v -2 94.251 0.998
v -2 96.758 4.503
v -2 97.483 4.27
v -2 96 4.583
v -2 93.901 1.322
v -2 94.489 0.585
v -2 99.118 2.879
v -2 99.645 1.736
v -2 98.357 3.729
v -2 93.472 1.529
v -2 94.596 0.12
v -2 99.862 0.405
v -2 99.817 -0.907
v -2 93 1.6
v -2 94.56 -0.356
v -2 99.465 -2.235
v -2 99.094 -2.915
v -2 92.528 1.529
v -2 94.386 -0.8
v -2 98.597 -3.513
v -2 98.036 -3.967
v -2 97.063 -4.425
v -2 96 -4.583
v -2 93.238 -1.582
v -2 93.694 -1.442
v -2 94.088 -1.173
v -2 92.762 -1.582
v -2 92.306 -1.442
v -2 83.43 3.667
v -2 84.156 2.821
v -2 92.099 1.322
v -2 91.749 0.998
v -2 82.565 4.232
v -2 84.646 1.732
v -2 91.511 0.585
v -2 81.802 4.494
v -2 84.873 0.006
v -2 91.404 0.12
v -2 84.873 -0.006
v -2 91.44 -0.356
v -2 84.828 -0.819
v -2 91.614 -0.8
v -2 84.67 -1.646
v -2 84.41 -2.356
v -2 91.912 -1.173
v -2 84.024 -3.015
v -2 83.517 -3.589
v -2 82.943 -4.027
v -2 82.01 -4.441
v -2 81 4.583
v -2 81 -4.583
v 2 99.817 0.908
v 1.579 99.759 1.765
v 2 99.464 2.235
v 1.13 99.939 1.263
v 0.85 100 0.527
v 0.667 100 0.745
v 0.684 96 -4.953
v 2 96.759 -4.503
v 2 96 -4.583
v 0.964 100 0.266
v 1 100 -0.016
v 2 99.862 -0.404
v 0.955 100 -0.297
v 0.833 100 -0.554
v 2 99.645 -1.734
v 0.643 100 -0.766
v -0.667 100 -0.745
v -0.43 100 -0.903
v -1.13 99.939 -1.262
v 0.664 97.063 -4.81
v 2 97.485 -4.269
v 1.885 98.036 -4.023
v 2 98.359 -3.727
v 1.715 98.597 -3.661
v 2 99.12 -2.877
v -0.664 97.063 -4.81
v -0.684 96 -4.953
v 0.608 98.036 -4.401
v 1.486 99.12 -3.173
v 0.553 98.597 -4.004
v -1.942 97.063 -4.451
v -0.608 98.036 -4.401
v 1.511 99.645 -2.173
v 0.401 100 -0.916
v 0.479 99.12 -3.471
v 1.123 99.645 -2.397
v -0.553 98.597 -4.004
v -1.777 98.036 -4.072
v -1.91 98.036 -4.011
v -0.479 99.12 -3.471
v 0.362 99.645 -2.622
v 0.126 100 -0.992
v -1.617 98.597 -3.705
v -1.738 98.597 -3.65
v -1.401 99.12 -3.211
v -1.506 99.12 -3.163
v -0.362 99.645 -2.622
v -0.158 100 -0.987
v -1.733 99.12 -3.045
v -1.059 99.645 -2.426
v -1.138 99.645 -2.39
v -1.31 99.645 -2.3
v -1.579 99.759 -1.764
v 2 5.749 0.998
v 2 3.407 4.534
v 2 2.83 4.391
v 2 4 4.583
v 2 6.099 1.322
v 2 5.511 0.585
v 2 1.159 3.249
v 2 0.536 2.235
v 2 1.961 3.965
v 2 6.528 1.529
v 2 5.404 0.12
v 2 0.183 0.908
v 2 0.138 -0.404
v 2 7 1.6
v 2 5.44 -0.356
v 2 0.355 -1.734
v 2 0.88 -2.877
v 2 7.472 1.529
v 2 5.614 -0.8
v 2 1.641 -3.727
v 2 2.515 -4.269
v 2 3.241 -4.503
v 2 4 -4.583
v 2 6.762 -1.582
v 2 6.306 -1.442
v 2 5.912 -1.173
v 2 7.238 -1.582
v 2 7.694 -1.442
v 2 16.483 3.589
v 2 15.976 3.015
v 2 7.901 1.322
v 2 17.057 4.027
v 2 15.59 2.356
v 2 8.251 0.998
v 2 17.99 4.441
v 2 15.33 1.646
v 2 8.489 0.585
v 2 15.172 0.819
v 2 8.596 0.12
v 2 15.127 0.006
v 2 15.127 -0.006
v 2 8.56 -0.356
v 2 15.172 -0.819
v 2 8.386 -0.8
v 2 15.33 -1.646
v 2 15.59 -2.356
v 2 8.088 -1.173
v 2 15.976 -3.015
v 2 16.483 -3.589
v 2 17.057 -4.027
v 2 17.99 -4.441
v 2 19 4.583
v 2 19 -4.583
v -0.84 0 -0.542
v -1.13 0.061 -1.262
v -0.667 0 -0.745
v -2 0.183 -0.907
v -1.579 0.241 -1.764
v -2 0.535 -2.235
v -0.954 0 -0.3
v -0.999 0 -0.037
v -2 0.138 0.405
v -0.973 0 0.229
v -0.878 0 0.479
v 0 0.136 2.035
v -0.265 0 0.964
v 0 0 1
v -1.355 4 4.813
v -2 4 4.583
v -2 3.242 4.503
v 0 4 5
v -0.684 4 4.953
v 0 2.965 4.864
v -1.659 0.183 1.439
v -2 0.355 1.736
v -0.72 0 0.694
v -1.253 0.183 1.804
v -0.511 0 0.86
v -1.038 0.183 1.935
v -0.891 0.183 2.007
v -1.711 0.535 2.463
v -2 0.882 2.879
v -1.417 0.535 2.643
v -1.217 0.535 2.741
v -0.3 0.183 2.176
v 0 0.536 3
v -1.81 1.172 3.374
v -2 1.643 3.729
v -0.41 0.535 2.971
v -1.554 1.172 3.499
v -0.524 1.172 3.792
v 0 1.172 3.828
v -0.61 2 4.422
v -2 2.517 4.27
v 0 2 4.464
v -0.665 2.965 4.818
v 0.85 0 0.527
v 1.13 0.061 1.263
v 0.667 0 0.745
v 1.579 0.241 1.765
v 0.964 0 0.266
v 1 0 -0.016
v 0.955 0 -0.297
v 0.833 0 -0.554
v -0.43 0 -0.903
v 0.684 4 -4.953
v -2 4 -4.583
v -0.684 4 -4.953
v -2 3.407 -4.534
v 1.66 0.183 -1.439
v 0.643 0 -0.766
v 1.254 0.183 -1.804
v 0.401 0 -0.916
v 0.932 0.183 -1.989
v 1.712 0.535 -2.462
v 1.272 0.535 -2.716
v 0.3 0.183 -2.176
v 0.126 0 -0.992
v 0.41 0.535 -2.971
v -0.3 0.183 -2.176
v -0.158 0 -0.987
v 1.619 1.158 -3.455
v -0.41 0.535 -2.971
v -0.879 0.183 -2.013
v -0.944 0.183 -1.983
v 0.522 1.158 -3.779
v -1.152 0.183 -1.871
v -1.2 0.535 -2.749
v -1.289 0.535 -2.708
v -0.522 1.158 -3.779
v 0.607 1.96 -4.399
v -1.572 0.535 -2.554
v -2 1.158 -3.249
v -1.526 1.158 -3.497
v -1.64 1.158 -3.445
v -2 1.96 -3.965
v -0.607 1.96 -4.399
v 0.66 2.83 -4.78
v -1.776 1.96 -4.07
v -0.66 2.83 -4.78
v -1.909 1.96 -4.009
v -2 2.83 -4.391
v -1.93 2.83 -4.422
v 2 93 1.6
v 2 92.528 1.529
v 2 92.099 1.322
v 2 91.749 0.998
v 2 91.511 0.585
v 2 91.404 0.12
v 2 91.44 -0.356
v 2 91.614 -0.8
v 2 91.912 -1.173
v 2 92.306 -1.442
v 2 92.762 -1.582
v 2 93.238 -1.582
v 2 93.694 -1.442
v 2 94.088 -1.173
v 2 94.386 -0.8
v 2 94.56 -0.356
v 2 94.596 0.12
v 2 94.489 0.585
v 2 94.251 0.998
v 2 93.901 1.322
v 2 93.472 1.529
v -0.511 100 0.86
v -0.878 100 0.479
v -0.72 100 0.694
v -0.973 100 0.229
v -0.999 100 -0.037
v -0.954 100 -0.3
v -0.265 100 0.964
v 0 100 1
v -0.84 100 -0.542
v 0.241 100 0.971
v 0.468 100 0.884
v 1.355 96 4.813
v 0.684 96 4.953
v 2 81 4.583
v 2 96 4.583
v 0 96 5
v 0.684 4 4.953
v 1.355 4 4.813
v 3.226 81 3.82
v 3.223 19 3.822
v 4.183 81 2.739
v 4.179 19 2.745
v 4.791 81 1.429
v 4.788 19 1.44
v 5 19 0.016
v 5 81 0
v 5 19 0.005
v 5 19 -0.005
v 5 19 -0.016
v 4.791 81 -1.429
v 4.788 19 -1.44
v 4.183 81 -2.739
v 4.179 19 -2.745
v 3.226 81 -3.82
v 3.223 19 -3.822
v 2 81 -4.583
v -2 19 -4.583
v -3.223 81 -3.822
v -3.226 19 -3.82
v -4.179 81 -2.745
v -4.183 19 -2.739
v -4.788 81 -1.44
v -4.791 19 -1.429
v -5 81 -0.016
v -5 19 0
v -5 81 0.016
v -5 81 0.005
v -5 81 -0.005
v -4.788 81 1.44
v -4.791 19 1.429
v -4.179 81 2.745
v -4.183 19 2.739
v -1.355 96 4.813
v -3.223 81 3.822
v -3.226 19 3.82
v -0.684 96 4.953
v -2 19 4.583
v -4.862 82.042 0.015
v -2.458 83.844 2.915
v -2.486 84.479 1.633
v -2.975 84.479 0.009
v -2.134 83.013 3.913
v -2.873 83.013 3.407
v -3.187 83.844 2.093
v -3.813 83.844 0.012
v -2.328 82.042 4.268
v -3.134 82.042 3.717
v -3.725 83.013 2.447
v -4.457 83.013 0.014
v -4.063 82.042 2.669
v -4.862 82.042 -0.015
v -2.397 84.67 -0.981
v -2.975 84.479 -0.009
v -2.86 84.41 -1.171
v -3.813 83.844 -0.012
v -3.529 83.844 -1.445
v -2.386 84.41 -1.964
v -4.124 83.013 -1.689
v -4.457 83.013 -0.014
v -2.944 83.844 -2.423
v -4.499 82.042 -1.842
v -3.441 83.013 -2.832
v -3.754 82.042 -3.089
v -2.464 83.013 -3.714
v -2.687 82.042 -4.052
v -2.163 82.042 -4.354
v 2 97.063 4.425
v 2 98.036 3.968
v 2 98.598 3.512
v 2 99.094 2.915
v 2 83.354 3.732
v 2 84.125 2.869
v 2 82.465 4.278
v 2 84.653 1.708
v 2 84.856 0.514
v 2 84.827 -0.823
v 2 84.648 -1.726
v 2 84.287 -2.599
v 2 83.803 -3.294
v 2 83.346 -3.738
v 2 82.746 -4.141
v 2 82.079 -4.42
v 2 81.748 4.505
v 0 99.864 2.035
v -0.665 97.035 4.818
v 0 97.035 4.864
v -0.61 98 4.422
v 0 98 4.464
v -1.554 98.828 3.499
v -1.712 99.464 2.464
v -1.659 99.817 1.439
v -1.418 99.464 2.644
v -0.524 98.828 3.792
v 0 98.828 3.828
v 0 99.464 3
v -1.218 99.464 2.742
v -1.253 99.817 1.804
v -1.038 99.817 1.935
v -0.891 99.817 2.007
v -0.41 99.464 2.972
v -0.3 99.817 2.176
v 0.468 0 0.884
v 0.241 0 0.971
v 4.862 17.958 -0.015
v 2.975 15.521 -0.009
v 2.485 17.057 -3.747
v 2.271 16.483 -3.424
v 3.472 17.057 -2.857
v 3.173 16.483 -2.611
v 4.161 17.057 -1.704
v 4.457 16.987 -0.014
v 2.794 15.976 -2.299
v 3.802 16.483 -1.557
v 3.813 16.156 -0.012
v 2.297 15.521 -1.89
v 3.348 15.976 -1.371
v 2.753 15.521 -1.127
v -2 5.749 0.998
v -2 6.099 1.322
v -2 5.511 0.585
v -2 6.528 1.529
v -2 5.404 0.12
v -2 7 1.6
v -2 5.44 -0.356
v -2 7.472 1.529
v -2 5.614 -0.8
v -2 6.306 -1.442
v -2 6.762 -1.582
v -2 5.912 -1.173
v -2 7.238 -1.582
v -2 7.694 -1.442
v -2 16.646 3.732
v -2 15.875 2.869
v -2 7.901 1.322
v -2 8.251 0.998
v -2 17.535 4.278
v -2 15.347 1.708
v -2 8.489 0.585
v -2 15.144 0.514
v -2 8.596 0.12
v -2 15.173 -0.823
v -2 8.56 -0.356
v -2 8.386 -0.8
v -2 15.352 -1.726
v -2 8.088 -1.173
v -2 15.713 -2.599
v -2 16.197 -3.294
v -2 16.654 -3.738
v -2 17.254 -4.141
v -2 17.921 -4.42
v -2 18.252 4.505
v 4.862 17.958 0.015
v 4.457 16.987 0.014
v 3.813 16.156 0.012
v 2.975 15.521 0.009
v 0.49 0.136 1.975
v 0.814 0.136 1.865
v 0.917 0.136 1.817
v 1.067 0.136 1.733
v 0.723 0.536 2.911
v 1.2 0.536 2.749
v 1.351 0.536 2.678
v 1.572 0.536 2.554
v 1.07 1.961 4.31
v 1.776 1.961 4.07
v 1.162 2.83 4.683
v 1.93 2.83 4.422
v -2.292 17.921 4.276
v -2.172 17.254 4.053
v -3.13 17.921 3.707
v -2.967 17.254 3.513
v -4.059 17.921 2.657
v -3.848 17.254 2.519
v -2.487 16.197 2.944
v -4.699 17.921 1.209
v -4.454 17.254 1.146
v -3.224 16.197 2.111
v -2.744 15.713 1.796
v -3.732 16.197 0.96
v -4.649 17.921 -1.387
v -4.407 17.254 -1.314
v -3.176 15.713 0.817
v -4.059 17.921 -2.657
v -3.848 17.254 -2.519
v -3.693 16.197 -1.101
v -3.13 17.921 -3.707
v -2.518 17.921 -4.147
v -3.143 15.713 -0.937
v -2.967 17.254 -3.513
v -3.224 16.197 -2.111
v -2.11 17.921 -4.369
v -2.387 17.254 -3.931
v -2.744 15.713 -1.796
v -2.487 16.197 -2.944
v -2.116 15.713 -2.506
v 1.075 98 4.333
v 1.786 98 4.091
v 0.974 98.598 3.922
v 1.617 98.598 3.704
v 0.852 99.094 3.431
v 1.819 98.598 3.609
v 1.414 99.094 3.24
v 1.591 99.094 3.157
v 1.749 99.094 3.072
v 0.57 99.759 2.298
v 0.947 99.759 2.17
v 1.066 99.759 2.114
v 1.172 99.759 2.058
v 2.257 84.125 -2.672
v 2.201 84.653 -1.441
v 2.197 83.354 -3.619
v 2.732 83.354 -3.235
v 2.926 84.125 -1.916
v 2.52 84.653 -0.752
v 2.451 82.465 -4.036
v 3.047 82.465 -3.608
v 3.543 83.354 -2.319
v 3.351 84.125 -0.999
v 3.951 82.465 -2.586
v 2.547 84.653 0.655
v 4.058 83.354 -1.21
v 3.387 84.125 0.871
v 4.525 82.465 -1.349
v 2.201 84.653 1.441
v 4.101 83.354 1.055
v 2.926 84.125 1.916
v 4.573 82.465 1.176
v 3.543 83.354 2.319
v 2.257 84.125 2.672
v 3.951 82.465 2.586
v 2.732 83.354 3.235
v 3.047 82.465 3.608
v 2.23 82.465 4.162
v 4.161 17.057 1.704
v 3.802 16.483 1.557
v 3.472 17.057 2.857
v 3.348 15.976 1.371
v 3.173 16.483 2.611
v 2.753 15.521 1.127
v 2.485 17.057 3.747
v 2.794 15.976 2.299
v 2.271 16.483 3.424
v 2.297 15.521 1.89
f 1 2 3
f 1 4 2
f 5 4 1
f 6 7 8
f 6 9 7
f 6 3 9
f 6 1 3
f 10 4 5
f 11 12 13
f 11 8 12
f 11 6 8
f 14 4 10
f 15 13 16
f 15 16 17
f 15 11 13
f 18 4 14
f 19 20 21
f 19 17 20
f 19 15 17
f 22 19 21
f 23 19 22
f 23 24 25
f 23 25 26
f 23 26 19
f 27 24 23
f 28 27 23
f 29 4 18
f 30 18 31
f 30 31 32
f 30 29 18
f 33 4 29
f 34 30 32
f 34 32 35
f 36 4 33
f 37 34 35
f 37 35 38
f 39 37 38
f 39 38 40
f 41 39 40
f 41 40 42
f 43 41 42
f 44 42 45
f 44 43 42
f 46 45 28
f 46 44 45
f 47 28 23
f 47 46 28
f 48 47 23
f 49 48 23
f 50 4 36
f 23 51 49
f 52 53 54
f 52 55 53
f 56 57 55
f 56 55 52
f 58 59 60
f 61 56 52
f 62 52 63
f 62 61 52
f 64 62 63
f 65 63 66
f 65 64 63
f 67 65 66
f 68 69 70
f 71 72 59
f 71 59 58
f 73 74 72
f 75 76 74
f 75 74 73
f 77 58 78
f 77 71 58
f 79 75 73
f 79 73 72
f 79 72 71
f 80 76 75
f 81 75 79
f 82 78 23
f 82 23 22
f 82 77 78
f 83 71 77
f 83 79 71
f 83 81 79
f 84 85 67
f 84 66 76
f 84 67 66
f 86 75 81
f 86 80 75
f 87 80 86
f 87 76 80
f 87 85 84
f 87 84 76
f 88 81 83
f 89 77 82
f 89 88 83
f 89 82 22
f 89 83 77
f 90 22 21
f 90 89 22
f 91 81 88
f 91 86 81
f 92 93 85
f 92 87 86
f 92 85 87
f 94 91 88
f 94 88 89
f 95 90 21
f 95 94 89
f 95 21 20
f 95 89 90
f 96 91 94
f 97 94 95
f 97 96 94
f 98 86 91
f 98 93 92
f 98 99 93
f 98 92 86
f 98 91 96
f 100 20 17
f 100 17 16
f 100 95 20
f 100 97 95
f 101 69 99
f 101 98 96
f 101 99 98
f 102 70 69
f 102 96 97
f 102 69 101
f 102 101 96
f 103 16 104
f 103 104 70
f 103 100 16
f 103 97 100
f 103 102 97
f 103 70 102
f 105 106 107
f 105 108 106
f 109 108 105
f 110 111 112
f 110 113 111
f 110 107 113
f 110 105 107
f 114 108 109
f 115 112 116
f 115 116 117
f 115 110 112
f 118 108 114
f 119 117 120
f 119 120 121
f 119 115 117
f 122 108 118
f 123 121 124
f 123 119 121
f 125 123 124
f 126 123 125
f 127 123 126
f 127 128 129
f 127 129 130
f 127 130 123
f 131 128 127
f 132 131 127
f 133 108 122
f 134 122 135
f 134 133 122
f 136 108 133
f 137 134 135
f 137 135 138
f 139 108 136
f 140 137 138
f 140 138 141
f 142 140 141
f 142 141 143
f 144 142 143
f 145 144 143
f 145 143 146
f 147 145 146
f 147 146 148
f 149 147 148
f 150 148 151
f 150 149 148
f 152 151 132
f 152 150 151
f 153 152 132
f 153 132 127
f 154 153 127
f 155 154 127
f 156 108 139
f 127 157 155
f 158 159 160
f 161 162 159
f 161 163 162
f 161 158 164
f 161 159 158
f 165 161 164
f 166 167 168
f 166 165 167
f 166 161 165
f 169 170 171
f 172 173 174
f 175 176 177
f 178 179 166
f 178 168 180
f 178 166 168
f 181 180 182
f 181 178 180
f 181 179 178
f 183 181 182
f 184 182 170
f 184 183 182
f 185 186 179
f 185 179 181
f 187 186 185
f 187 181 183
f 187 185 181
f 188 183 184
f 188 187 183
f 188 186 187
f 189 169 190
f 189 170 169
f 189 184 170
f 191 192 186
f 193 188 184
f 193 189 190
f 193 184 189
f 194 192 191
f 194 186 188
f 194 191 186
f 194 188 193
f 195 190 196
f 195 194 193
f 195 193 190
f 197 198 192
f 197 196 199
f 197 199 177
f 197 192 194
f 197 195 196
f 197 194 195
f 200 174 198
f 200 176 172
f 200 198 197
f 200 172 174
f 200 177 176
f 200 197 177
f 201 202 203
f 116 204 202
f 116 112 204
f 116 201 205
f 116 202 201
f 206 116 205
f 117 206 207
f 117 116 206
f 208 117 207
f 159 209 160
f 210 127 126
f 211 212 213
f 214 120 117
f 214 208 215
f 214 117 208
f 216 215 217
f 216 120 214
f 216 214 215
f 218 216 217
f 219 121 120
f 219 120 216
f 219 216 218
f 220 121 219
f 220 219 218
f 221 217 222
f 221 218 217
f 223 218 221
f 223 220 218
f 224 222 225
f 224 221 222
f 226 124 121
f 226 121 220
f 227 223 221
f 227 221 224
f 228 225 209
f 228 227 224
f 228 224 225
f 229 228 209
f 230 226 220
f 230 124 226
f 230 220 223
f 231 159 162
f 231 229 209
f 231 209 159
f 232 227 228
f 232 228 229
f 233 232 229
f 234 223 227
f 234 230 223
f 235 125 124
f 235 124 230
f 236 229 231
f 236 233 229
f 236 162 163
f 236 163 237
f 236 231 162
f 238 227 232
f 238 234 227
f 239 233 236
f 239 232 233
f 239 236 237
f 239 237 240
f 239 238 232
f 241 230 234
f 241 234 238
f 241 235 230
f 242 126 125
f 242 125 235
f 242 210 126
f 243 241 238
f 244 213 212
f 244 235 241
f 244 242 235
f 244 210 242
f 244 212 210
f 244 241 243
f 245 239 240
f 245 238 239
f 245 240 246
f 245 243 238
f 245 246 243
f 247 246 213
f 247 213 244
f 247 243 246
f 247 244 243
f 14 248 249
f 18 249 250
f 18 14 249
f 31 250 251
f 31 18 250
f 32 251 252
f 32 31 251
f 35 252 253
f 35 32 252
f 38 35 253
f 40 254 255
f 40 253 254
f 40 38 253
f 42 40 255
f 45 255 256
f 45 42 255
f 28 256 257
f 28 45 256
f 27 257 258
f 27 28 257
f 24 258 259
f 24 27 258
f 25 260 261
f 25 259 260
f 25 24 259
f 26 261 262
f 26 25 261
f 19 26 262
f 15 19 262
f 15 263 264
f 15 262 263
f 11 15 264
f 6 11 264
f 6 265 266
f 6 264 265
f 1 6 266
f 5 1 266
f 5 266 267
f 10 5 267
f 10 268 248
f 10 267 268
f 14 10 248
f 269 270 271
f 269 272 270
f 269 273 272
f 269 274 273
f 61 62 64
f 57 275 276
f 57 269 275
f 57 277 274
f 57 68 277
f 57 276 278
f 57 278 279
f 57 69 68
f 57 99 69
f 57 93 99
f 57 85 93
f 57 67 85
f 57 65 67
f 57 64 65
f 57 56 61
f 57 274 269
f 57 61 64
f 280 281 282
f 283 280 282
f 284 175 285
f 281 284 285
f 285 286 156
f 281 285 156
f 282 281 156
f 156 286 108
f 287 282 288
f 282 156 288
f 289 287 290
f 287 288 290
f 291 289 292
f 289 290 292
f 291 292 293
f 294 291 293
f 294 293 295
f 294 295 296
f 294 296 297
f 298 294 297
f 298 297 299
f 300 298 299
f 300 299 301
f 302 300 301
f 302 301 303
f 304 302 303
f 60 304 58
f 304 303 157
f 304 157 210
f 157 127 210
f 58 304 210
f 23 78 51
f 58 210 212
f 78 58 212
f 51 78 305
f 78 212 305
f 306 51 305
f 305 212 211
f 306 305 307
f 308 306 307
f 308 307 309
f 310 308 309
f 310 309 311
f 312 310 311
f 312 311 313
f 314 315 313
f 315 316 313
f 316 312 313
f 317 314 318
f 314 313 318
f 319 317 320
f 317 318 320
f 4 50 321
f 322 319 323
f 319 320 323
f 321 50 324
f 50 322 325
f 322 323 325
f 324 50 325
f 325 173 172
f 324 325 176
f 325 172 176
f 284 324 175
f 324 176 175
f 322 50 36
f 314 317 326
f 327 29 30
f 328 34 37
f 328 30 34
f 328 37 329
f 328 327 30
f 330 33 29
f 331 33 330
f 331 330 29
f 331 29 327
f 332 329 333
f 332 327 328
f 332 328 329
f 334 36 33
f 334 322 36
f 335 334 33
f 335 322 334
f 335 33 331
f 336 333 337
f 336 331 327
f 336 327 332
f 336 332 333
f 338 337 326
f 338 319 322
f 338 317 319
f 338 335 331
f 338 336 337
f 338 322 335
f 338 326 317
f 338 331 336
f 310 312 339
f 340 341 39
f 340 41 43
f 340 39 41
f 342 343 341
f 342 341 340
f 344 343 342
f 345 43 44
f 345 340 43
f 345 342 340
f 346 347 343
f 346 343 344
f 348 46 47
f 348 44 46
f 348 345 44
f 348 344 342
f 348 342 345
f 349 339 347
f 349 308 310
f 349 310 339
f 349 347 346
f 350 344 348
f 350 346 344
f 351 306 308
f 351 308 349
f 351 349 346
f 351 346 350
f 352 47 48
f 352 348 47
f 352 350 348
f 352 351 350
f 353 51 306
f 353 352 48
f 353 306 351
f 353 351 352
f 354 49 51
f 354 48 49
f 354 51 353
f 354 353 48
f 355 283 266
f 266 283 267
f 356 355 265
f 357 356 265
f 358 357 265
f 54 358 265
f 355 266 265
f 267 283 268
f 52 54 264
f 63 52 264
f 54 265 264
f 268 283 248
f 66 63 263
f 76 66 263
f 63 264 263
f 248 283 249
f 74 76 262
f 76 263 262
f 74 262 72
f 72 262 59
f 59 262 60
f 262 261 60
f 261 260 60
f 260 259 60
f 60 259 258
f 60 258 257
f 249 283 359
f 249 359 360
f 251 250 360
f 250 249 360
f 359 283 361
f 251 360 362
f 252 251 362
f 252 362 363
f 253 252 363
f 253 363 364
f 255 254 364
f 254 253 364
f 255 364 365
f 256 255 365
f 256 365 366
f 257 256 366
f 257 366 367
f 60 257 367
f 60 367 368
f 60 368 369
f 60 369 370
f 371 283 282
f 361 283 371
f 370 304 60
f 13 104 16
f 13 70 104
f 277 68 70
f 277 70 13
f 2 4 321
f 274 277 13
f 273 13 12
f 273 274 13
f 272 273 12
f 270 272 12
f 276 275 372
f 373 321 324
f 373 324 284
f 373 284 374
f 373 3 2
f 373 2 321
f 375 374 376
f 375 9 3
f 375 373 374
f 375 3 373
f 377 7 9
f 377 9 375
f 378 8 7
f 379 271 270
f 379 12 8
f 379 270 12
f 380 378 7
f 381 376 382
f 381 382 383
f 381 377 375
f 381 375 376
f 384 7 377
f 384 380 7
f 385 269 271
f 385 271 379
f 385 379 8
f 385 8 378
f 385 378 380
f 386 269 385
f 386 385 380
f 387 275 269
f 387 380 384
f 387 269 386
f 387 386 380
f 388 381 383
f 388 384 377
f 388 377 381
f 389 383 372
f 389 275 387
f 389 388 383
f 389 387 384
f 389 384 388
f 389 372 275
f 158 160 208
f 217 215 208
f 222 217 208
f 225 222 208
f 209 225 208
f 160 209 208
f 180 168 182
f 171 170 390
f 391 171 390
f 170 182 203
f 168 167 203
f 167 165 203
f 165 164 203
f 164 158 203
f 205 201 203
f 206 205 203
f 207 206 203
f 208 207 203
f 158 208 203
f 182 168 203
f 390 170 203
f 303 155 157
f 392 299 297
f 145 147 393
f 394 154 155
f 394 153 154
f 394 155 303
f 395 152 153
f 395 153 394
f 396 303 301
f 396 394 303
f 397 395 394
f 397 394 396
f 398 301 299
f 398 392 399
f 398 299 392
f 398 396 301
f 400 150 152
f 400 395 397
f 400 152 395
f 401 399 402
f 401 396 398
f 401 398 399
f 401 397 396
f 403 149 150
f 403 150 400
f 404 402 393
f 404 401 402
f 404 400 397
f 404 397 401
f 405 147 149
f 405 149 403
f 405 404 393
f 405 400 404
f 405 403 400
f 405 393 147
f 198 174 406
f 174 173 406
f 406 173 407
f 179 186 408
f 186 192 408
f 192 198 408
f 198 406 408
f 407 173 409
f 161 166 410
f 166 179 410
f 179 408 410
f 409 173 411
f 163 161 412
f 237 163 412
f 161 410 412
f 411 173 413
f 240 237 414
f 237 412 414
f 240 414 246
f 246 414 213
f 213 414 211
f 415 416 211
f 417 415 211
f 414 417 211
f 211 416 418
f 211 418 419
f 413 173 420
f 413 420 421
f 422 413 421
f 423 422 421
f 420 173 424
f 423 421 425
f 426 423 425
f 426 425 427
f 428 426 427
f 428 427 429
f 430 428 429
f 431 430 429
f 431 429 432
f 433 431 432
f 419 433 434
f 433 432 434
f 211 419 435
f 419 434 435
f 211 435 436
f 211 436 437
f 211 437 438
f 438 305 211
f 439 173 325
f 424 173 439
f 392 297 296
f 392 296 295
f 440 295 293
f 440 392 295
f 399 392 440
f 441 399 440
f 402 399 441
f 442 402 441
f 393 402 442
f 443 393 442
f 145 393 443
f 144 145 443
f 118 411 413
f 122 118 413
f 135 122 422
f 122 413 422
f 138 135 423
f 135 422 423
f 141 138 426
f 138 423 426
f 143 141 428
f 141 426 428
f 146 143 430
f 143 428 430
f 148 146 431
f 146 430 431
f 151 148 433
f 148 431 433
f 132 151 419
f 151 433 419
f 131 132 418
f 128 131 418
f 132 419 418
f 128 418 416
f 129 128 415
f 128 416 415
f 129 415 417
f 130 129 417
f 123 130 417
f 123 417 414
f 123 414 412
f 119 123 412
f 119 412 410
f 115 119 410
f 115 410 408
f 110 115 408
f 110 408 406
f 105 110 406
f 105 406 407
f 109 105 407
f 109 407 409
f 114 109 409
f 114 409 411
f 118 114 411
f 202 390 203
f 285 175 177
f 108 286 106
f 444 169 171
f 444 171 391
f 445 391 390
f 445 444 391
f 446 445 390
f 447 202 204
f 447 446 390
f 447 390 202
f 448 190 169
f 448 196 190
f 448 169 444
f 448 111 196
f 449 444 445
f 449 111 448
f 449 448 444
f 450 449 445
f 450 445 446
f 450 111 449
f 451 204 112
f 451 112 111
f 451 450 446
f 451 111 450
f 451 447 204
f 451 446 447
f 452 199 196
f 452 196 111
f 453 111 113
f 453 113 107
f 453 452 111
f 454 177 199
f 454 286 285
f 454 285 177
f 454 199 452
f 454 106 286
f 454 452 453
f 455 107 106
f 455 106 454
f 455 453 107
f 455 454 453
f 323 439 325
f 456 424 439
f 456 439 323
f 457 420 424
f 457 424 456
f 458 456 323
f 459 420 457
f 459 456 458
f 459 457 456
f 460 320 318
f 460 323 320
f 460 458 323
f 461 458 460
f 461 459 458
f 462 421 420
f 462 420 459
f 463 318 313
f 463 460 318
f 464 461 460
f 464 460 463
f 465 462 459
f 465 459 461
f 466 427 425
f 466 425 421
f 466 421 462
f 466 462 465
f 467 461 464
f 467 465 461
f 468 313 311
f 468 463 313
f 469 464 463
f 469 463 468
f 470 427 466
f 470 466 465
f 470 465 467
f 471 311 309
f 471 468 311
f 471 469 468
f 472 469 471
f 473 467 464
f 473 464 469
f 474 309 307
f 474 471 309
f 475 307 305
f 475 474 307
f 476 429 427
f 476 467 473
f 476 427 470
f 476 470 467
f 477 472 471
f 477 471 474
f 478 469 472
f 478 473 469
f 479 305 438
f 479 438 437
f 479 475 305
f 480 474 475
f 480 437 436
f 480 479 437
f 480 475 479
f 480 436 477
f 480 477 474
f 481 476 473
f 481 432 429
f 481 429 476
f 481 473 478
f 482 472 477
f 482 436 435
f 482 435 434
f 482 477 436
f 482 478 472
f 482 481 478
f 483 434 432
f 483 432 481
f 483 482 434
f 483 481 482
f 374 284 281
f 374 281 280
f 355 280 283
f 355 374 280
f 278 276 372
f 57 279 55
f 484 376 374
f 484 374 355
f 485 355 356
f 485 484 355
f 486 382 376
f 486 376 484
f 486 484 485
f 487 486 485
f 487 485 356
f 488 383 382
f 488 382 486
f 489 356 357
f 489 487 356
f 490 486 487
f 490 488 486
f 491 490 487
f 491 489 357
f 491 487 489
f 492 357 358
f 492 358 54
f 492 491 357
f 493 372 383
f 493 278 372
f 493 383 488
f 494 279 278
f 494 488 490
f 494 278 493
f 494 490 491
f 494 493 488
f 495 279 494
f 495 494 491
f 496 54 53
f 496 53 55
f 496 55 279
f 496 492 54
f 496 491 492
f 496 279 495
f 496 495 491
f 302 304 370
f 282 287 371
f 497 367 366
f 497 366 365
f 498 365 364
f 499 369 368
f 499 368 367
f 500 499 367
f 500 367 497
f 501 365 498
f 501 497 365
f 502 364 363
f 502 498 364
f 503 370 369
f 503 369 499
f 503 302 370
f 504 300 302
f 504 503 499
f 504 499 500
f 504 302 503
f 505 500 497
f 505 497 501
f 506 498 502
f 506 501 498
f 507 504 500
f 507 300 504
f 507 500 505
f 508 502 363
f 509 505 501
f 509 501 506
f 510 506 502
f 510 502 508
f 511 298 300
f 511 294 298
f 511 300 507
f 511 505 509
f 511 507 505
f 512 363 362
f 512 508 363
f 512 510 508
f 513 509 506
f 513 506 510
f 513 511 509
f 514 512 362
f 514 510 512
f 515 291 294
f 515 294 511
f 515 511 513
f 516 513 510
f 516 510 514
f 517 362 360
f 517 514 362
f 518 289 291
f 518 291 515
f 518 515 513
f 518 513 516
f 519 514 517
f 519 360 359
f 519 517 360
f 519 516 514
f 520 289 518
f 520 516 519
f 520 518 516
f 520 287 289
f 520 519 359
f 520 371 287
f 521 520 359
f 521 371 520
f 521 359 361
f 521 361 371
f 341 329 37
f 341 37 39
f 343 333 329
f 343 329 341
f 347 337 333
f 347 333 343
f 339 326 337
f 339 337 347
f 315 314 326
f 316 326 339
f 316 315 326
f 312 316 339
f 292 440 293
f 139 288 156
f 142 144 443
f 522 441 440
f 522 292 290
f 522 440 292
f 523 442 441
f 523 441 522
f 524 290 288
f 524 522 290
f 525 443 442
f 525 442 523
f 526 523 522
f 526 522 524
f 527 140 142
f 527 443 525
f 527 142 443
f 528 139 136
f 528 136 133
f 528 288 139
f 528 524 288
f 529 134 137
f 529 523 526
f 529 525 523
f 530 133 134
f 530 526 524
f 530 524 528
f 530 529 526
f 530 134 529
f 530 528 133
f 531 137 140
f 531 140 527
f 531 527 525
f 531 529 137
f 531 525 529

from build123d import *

# Parameters (mm, degrees)
SKETCH10_R              = 5
BOSS_EXTRUDE1_DEPTH     = 100
SKETCH11_W              = 10
SKETCH11_H              = 15
CUT_EXTRUDE1_DEPTH      = 100
SKETCH12_R              = 1.6
CUT_EXTRUDE2_DEPTH      = 101.369318021
MIRROR8_COPY_1_SKETCH_W = 10
MIRROR8_COPY_1_SKETCH_H = 15
MIRROR8_COPY_1_DEPTH    = 100
MIRROR8_COPY_2_SKETCH_W = 10
MIRROR8_COPY_2_SKETCH_H = 15
MIRROR8_COPY_2_DEPTH    = 100
FILLET1_R               = 4
FILLET2_R               = 4


with BuildPart() as part:
    # Sketch10 → Boss-Extrude1 (new body)
    with BuildSketch(Plane(origin=(0, 0, 0), x_dir=(1, 0, 0), z_dir=(0, 1, 0))):
        with Locations(Location((0, 0, 0), (0, 0, 270))):
            Circle(SKETCH10_R)
    extrude(amount=BOSS_EXTRUDE1_DEPTH)

    # Sketch11 → Cut-Extrude1 (cut)
    with BuildSketch(Plane(origin=(2, 0, 0), x_dir=(0, 0, -1), z_dir=(1, 0, 0))):
        with Locations((0, 7.5)):
            Rectangle(SKETCH11_W, SKETCH11_H)
    cut_extrude1 = extrude(amount=CUT_EXTRUDE1_DEPTH, mode=Mode.SUBTRACT)

    # Mirror1: Cut-Extrude1 across plane
    add(cut_extrude1.mirror(Plane(origin=(0, 0, 0), x_dir=(0, 0, 1), z_dir=(1, 0, 0))), mode=Mode.SUBTRACT)

    # Sketch12 → Cut-Extrude2 (cut, through all)
    with BuildSketch(Plane.ZY.offset(2)):
        with Locations((0, 7)):
            Circle(SKETCH12_R)
    cut_extrude2 = extrude(amount=-CUT_EXTRUDE2_DEPTH, mode=Mode.SUBTRACT)

    # Mirror7: Cut-Extrude1 across plane
    add(cut_extrude1.mirror(Plane(origin=(0, 50, 0), x_dir=(0, 0, 1), z_dir=(0, -1, 0))), mode=Mode.SUBTRACT)

    # Mirror8 copy 1 sketch → Mirror8 copy 1 (cut)
    with BuildSketch(Plane(origin=(-2, 100, 0), x_dir=(0, 0, -1), z_dir=(-1, 0, 0))):
        with Locations((0, 7.5)):
            Rectangle(MIRROR8_COPY_1_SKETCH_W, MIRROR8_COPY_1_SKETCH_H)
    extrude(amount=MIRROR8_COPY_1_DEPTH, mode=Mode.SUBTRACT)

    # Mirror8 copy 2 sketch → Mirror8 copy 2 (cut)
    with BuildSketch(Plane(origin=(2, 100, 0), x_dir=(0, 0, -1), z_dir=(1, 0, 0))):
        with Locations((0, -7.5)):
            Rectangle(MIRROR8_COPY_2_SKETCH_W, MIRROR8_COPY_2_SKETCH_H)
    extrude(amount=MIRROR8_COPY_2_DEPTH, mode=Mode.SUBTRACT)

    # Mirror9: Cut-Extrude2 across plane
    add(cut_extrude2.mirror(Plane(origin=(0, 50, 0), x_dir=(0, 0, 1), z_dir=(0, -1, 0))), mode=Mode.SUBTRACT)

    # Fillet1
    # the kernel refuses this fillet: 4 mm, written as the material it takes off along each edge
    with BuildSketch(Plane(origin=(0, 15, 0), x_dir=(0.9999950652018581, 0, 0.003141587485879613), z_dir=(0.003141587485879613, 0, -0.9999950652018581))) as fillet1_piece_1_section:
        with BuildLine():
            CenterArc((5 - FILLET1_R, -FILLET1_R), FILLET1_R, 0, 90)
            Line((5 - FILLET1_R, 0), (5, 0))
            Line((5, 0), (5, -FILLET1_R))
        make_face()
    fillet1_piece_1 = revolve(axis=Axis((0, 15, 0), (0, -1, 0)), revolution_arc=359.64, mode=Mode.PRIVATE)
    fillet1_piece_1 = split(fillet1_piece_1, bisect_by=Plane(origin=(2, 16.020930517, 2.132715254), z_dir=(1, 0, 0)), keep=Keep.TOP, mode=Mode.PRIVATE)
    add(fillet1_piece_1, mode=Mode.SUBTRACT)
    with BuildSketch(Plane(origin=(0, 15, 0), x_dir=(0.9999950652018581, 0, 0.003141587485879613), z_dir=(0.003141587485879613, 0, -0.9999950652018581))) as fillet1_piece_2_section:
        with BuildLine():
            CenterArc((5 - FILLET1_R, -FILLET1_R), FILLET1_R, 0, 90)
            Line((5 - FILLET1_R, 0), (5, 0))
            Line((5, 0), (5, -FILLET1_R))
        make_face()
    fillet1_piece_2 = revolve(axis=Axis((0, 15, 0), (0, -1, 0)), revolution_arc=359.64, mode=Mode.PRIVATE)
    fillet1_piece_2 = split(fillet1_piece_2, bisect_by=Plane(origin=(-2, 16.531416738, 0), z_dir=(-1, 0, 0)), keep=Keep.TOP, mode=Mode.PRIVATE)
    add(fillet1_piece_2, mode=Mode.SUBTRACT)
    with BuildSketch(Plane(origin=(0, 15, 0), x_dir=(-0.9999950652018581, 0, -0.0031415874858794907), z_dir=(-0.0031415874858794907, 0, 0.9999950652018581))) as fillet1_piece_3_section:
        with BuildLine():
            CenterArc((5 - FILLET1_R, -FILLET1_R), FILLET1_R, 0, 90)
            Line((5 - FILLET1_R, 0), (5, 0))
            Line((5, 0), (5, -FILLET1_R))
        make_face()
    fillet1_piece_3 = revolve(axis=Axis((0, 15, 0), (0, -1, 0)), revolution_arc=359.64, mode=Mode.PRIVATE)
    fillet1_piece_3 = split(fillet1_piece_3, bisect_by=Plane(origin=(-2, 16.020930615, -2.132715254), z_dir=(-1, 0, 0)), keep=Keep.TOP, mode=Mode.PRIVATE)
    add(fillet1_piece_3, mode=Mode.SUBTRACT)
    with BuildSketch(Plane(origin=(0, 15, 0), x_dir=(-0.9999950652018581, 0, -0.0031415874858794907), z_dir=(-0.0031415874858794907, 0, 0.9999950652018581))) as fillet1_piece_4_section:
        with BuildLine():
            CenterArc((5 - FILLET1_R, -FILLET1_R), FILLET1_R, 0, 90)
            Line((5 - FILLET1_R, 0), (5, 0))
            Line((5, 0), (5, -FILLET1_R))
        make_face()
    fillet1_piece_4 = revolve(axis=Axis((0, 15, 0), (0, -1, 0)), revolution_arc=359.64, mode=Mode.PRIVATE)
    fillet1_piece_4 = split(fillet1_piece_4, bisect_by=Plane(origin=(2, 16.531416738, 0), z_dir=(1, 0, 0)), keep=Keep.TOP, mode=Mode.PRIVATE)
    add(fillet1_piece_4, mode=Mode.SUBTRACT)
    with BuildSketch(Plane(origin=(0, 85, 0), x_dir=(-0.9999950652018581, 0, -0.0031415874858794907), z_dir=(-0.0031415874858794907, 0, 0.9999950652018581))) as fillet1_piece_5_section:
        with BuildLine():
            CenterArc((5 - FILLET1_R, FILLET1_R), FILLET1_R, 270, 90)
            Line((5 - FILLET1_R, 0), (5, 0))
            Line((5, 0), (5, FILLET1_R))
        make_face()
    fillet1_piece_5 = revolve(axis=Axis((0, 85, 0), (0, -1, 0)), revolution_arc=359.64, mode=Mode.PRIVATE)
    fillet1_piece_5 = split(fillet1_piece_5, bisect_by=Plane(origin=(-2, 83.979069385, -2.132715254), z_dir=(-1, 0, 0)), keep=Keep.TOP, mode=Mode.PRIVATE)
    add(fillet1_piece_5, mode=Mode.SUBTRACT)
    with BuildSketch(Plane(origin=(0, 85, 0), x_dir=(-0.9999950652018581, 0, -0.0031415874858794907), z_dir=(-0.0031415874858794907, 0, 0.9999950652018581))) as fillet1_piece_6_section:
        with BuildLine():
            CenterArc((5 - FILLET1_R, FILLET1_R), FILLET1_R, 270, 90)
            Line((5 - FILLET1_R, 0), (5, 0))
            Line((5, 0), (5, FILLET1_R))
        make_face()
    fillet1_piece_6 = revolve(axis=Axis((0, 85, 0), (0, -1, 0)), revolution_arc=359.64, mode=Mode.PRIVATE)
    fillet1_piece_6 = split(fillet1_piece_6, bisect_by=Plane(origin=(2, 83.468583262, 0), z_dir=(1, 0, 0)), keep=Keep.TOP, mode=Mode.PRIVATE)
    add(fillet1_piece_6, mode=Mode.SUBTRACT)
    with BuildSketch(Plane(origin=(0, 85, 0), x_dir=(0.9999950652018581, 0, 0.003141587485879613), z_dir=(0.003141587485879613, 0, -0.9999950652018581))) as fillet1_piece_7_section:
        with BuildLine():
            CenterArc((5 - FILLET1_R, FILLET1_R), FILLET1_R, 270, 90)
            Line((5 - FILLET1_R, 0), (5, 0))
            Line((5, 0), (5, FILLET1_R))
        make_face()
    fillet1_piece_7 = revolve(axis=Axis((0, 85, 0), (0, -1, 0)), revolution_arc=359.64, mode=Mode.PRIVATE)
    fillet1_piece_7 = split(fillet1_piece_7, bisect_by=Plane(origin=(2, 83.979069483, 2.132715254), z_dir=(1, 0, 0)), keep=Keep.TOP, mode=Mode.PRIVATE)
    add(fillet1_piece_7, mode=Mode.SUBTRACT)
    with BuildSketch(Plane(origin=(0, 85, 0), x_dir=(0.9999950652018581, 0, 0.003141587485879613), z_dir=(0.003141587485879613, 0, -0.9999950652018581))) as fillet1_piece_8_section:
        with BuildLine():
            CenterArc((5 - FILLET1_R, FILLET1_R), FILLET1_R, 270, 90)
            Line((5 - FILLET1_R, 0), (5, 0))
            Line((5, 0), (5, FILLET1_R))
        make_face()
    fillet1_piece_8 = revolve(axis=Axis((0, 85, 0), (0, -1, 0)), revolution_arc=359.64, mode=Mode.PRIVATE)
    fillet1_piece_8 = split(fillet1_piece_8, bisect_by=Plane(origin=(-2, 83.468583262, 0), z_dir=(-1, 0, 0)), keep=Keep.TOP, mode=Mode.PRIVATE)
    add(fillet1_piece_8, mode=Mode.SUBTRACT)

    # Fillet2
    # the kernel refuses this fillet: 4 mm, written as the material it takes off along each edge
    with BuildSketch(Plane(origin=(0, 0, 0), x_dir=(-0.6668850456417628, 0, -0.7451606108077533), z_dir=(0.7451606108077533, 0, -0.6668850456417628))) as fillet2_piece_1:
        with BuildLine():
            CenterArc((5 - FILLET2_R, FILLET2_R), FILLET2_R, 270, 90)
            Line((5 - FILLET2_R, 0), (5, 0))
            Line((5, 0), (5, FILLET2_R))
        make_face()
    revolve(axis=Axis((0, 0, 0), (0, 1, 0)), revolution_arc=138.172896035, mode=Mode.SUBTRACT)
    with BuildSketch(Plane(origin=(0, 0, 0), x_dir=(0.6667617921571638, 0, 0.7452708987471381), z_dir=(-0.7452708987471381, 0, 0.6667617921571638))) as fillet2_piece_2:
        with BuildLine():
            CenterArc((5 - FILLET2_R, FILLET2_R), FILLET2_R, 270, 90)
            Line((5 - FILLET2_R, 0), (5, 0))
            Line((5, 0), (5, FILLET2_R))
        make_face()
    revolve(axis=Axis((0, 0, 0), (0, 1, 0)), revolution_arc=276.364744713, mode=Mode.SUBTRACT)
    with BuildSketch(Plane(origin=(0, 100, 0), x_dir=(-0.6668850456417623, 0, -0.7451606108077536), z_dir=(0.7451606108077536, 0, -0.6668850456417623))) as fillet2_piece_3:
        with BuildLine():
            CenterArc((5 - FILLET2_R, -FILLET2_R), FILLET2_R, 0, 90)
            Line((5 - FILLET2_R, 0), (5, 0))
            Line((5, 0), (5, -FILLET2_R))
        make_face()
    revolve(axis=Axis((0, 100, 0), (0, 1, 0)), revolution_arc=138.172896035, mode=Mode.SUBTRACT)
    with BuildSketch(Plane(origin=(0, 100, 0), x_dir=(0.6667617921571635, 0, 0.7452708987471385), z_dir=(-0.7452708987471385, 0, 0.6667617921571635))) as fillet2_piece_4:
        with BuildLine():
            CenterArc((5 - FILLET2_R, -FILLET2_R), FILLET2_R, 0, 90)
            Line((5 - FILLET2_R, 0), (5, 0))
            Line((5, 0), (5, -FILLET2_R))
        make_face()
    revolve(axis=Axis((0, 100, 0), (0, 1, 0)), revolution_arc=276.364744713, mode=Mode.SUBTRACT)
    with BuildSketch(Plane(origin=(0, 100, 0), x_dir=(0, 0, 1), z_dir=(-1, 0, 0))) as fillet2_piece_5:
        with BuildLine():
            CenterArc((5 - FILLET2_R, -FILLET2_R), FILLET2_R, 0, 90)
            Line((5 - FILLET2_R, 0), (5, 0))
            Line((5, 0), (5, -FILLET2_R))
        make_face()
    revolve(axis=Axis((0, 100, 0), (0, 1, 0)), revolution_arc=138.172896035, mode=Mode.SUBTRACT)
    with BuildSketch(Plane(origin=(0, 0, 0), x_dir=(0, 0, 1), z_dir=(-1, 0, 0))) as fillet2_piece_6:
        with BuildLine():
            CenterArc((5 - FILLET2_R, FILLET2_R), FILLET2_R, 270, 90)
            Line((5 - FILLET2_R, 0), (5, 0))
            Line((5, 0), (5, FILLET2_R))
        make_face()
    revolve(axis=Axis((0, 0, 0), (0, 1, 0)), revolution_arc=138.172896035, mode=Mode.SUBTRACT)


solid = part.part
